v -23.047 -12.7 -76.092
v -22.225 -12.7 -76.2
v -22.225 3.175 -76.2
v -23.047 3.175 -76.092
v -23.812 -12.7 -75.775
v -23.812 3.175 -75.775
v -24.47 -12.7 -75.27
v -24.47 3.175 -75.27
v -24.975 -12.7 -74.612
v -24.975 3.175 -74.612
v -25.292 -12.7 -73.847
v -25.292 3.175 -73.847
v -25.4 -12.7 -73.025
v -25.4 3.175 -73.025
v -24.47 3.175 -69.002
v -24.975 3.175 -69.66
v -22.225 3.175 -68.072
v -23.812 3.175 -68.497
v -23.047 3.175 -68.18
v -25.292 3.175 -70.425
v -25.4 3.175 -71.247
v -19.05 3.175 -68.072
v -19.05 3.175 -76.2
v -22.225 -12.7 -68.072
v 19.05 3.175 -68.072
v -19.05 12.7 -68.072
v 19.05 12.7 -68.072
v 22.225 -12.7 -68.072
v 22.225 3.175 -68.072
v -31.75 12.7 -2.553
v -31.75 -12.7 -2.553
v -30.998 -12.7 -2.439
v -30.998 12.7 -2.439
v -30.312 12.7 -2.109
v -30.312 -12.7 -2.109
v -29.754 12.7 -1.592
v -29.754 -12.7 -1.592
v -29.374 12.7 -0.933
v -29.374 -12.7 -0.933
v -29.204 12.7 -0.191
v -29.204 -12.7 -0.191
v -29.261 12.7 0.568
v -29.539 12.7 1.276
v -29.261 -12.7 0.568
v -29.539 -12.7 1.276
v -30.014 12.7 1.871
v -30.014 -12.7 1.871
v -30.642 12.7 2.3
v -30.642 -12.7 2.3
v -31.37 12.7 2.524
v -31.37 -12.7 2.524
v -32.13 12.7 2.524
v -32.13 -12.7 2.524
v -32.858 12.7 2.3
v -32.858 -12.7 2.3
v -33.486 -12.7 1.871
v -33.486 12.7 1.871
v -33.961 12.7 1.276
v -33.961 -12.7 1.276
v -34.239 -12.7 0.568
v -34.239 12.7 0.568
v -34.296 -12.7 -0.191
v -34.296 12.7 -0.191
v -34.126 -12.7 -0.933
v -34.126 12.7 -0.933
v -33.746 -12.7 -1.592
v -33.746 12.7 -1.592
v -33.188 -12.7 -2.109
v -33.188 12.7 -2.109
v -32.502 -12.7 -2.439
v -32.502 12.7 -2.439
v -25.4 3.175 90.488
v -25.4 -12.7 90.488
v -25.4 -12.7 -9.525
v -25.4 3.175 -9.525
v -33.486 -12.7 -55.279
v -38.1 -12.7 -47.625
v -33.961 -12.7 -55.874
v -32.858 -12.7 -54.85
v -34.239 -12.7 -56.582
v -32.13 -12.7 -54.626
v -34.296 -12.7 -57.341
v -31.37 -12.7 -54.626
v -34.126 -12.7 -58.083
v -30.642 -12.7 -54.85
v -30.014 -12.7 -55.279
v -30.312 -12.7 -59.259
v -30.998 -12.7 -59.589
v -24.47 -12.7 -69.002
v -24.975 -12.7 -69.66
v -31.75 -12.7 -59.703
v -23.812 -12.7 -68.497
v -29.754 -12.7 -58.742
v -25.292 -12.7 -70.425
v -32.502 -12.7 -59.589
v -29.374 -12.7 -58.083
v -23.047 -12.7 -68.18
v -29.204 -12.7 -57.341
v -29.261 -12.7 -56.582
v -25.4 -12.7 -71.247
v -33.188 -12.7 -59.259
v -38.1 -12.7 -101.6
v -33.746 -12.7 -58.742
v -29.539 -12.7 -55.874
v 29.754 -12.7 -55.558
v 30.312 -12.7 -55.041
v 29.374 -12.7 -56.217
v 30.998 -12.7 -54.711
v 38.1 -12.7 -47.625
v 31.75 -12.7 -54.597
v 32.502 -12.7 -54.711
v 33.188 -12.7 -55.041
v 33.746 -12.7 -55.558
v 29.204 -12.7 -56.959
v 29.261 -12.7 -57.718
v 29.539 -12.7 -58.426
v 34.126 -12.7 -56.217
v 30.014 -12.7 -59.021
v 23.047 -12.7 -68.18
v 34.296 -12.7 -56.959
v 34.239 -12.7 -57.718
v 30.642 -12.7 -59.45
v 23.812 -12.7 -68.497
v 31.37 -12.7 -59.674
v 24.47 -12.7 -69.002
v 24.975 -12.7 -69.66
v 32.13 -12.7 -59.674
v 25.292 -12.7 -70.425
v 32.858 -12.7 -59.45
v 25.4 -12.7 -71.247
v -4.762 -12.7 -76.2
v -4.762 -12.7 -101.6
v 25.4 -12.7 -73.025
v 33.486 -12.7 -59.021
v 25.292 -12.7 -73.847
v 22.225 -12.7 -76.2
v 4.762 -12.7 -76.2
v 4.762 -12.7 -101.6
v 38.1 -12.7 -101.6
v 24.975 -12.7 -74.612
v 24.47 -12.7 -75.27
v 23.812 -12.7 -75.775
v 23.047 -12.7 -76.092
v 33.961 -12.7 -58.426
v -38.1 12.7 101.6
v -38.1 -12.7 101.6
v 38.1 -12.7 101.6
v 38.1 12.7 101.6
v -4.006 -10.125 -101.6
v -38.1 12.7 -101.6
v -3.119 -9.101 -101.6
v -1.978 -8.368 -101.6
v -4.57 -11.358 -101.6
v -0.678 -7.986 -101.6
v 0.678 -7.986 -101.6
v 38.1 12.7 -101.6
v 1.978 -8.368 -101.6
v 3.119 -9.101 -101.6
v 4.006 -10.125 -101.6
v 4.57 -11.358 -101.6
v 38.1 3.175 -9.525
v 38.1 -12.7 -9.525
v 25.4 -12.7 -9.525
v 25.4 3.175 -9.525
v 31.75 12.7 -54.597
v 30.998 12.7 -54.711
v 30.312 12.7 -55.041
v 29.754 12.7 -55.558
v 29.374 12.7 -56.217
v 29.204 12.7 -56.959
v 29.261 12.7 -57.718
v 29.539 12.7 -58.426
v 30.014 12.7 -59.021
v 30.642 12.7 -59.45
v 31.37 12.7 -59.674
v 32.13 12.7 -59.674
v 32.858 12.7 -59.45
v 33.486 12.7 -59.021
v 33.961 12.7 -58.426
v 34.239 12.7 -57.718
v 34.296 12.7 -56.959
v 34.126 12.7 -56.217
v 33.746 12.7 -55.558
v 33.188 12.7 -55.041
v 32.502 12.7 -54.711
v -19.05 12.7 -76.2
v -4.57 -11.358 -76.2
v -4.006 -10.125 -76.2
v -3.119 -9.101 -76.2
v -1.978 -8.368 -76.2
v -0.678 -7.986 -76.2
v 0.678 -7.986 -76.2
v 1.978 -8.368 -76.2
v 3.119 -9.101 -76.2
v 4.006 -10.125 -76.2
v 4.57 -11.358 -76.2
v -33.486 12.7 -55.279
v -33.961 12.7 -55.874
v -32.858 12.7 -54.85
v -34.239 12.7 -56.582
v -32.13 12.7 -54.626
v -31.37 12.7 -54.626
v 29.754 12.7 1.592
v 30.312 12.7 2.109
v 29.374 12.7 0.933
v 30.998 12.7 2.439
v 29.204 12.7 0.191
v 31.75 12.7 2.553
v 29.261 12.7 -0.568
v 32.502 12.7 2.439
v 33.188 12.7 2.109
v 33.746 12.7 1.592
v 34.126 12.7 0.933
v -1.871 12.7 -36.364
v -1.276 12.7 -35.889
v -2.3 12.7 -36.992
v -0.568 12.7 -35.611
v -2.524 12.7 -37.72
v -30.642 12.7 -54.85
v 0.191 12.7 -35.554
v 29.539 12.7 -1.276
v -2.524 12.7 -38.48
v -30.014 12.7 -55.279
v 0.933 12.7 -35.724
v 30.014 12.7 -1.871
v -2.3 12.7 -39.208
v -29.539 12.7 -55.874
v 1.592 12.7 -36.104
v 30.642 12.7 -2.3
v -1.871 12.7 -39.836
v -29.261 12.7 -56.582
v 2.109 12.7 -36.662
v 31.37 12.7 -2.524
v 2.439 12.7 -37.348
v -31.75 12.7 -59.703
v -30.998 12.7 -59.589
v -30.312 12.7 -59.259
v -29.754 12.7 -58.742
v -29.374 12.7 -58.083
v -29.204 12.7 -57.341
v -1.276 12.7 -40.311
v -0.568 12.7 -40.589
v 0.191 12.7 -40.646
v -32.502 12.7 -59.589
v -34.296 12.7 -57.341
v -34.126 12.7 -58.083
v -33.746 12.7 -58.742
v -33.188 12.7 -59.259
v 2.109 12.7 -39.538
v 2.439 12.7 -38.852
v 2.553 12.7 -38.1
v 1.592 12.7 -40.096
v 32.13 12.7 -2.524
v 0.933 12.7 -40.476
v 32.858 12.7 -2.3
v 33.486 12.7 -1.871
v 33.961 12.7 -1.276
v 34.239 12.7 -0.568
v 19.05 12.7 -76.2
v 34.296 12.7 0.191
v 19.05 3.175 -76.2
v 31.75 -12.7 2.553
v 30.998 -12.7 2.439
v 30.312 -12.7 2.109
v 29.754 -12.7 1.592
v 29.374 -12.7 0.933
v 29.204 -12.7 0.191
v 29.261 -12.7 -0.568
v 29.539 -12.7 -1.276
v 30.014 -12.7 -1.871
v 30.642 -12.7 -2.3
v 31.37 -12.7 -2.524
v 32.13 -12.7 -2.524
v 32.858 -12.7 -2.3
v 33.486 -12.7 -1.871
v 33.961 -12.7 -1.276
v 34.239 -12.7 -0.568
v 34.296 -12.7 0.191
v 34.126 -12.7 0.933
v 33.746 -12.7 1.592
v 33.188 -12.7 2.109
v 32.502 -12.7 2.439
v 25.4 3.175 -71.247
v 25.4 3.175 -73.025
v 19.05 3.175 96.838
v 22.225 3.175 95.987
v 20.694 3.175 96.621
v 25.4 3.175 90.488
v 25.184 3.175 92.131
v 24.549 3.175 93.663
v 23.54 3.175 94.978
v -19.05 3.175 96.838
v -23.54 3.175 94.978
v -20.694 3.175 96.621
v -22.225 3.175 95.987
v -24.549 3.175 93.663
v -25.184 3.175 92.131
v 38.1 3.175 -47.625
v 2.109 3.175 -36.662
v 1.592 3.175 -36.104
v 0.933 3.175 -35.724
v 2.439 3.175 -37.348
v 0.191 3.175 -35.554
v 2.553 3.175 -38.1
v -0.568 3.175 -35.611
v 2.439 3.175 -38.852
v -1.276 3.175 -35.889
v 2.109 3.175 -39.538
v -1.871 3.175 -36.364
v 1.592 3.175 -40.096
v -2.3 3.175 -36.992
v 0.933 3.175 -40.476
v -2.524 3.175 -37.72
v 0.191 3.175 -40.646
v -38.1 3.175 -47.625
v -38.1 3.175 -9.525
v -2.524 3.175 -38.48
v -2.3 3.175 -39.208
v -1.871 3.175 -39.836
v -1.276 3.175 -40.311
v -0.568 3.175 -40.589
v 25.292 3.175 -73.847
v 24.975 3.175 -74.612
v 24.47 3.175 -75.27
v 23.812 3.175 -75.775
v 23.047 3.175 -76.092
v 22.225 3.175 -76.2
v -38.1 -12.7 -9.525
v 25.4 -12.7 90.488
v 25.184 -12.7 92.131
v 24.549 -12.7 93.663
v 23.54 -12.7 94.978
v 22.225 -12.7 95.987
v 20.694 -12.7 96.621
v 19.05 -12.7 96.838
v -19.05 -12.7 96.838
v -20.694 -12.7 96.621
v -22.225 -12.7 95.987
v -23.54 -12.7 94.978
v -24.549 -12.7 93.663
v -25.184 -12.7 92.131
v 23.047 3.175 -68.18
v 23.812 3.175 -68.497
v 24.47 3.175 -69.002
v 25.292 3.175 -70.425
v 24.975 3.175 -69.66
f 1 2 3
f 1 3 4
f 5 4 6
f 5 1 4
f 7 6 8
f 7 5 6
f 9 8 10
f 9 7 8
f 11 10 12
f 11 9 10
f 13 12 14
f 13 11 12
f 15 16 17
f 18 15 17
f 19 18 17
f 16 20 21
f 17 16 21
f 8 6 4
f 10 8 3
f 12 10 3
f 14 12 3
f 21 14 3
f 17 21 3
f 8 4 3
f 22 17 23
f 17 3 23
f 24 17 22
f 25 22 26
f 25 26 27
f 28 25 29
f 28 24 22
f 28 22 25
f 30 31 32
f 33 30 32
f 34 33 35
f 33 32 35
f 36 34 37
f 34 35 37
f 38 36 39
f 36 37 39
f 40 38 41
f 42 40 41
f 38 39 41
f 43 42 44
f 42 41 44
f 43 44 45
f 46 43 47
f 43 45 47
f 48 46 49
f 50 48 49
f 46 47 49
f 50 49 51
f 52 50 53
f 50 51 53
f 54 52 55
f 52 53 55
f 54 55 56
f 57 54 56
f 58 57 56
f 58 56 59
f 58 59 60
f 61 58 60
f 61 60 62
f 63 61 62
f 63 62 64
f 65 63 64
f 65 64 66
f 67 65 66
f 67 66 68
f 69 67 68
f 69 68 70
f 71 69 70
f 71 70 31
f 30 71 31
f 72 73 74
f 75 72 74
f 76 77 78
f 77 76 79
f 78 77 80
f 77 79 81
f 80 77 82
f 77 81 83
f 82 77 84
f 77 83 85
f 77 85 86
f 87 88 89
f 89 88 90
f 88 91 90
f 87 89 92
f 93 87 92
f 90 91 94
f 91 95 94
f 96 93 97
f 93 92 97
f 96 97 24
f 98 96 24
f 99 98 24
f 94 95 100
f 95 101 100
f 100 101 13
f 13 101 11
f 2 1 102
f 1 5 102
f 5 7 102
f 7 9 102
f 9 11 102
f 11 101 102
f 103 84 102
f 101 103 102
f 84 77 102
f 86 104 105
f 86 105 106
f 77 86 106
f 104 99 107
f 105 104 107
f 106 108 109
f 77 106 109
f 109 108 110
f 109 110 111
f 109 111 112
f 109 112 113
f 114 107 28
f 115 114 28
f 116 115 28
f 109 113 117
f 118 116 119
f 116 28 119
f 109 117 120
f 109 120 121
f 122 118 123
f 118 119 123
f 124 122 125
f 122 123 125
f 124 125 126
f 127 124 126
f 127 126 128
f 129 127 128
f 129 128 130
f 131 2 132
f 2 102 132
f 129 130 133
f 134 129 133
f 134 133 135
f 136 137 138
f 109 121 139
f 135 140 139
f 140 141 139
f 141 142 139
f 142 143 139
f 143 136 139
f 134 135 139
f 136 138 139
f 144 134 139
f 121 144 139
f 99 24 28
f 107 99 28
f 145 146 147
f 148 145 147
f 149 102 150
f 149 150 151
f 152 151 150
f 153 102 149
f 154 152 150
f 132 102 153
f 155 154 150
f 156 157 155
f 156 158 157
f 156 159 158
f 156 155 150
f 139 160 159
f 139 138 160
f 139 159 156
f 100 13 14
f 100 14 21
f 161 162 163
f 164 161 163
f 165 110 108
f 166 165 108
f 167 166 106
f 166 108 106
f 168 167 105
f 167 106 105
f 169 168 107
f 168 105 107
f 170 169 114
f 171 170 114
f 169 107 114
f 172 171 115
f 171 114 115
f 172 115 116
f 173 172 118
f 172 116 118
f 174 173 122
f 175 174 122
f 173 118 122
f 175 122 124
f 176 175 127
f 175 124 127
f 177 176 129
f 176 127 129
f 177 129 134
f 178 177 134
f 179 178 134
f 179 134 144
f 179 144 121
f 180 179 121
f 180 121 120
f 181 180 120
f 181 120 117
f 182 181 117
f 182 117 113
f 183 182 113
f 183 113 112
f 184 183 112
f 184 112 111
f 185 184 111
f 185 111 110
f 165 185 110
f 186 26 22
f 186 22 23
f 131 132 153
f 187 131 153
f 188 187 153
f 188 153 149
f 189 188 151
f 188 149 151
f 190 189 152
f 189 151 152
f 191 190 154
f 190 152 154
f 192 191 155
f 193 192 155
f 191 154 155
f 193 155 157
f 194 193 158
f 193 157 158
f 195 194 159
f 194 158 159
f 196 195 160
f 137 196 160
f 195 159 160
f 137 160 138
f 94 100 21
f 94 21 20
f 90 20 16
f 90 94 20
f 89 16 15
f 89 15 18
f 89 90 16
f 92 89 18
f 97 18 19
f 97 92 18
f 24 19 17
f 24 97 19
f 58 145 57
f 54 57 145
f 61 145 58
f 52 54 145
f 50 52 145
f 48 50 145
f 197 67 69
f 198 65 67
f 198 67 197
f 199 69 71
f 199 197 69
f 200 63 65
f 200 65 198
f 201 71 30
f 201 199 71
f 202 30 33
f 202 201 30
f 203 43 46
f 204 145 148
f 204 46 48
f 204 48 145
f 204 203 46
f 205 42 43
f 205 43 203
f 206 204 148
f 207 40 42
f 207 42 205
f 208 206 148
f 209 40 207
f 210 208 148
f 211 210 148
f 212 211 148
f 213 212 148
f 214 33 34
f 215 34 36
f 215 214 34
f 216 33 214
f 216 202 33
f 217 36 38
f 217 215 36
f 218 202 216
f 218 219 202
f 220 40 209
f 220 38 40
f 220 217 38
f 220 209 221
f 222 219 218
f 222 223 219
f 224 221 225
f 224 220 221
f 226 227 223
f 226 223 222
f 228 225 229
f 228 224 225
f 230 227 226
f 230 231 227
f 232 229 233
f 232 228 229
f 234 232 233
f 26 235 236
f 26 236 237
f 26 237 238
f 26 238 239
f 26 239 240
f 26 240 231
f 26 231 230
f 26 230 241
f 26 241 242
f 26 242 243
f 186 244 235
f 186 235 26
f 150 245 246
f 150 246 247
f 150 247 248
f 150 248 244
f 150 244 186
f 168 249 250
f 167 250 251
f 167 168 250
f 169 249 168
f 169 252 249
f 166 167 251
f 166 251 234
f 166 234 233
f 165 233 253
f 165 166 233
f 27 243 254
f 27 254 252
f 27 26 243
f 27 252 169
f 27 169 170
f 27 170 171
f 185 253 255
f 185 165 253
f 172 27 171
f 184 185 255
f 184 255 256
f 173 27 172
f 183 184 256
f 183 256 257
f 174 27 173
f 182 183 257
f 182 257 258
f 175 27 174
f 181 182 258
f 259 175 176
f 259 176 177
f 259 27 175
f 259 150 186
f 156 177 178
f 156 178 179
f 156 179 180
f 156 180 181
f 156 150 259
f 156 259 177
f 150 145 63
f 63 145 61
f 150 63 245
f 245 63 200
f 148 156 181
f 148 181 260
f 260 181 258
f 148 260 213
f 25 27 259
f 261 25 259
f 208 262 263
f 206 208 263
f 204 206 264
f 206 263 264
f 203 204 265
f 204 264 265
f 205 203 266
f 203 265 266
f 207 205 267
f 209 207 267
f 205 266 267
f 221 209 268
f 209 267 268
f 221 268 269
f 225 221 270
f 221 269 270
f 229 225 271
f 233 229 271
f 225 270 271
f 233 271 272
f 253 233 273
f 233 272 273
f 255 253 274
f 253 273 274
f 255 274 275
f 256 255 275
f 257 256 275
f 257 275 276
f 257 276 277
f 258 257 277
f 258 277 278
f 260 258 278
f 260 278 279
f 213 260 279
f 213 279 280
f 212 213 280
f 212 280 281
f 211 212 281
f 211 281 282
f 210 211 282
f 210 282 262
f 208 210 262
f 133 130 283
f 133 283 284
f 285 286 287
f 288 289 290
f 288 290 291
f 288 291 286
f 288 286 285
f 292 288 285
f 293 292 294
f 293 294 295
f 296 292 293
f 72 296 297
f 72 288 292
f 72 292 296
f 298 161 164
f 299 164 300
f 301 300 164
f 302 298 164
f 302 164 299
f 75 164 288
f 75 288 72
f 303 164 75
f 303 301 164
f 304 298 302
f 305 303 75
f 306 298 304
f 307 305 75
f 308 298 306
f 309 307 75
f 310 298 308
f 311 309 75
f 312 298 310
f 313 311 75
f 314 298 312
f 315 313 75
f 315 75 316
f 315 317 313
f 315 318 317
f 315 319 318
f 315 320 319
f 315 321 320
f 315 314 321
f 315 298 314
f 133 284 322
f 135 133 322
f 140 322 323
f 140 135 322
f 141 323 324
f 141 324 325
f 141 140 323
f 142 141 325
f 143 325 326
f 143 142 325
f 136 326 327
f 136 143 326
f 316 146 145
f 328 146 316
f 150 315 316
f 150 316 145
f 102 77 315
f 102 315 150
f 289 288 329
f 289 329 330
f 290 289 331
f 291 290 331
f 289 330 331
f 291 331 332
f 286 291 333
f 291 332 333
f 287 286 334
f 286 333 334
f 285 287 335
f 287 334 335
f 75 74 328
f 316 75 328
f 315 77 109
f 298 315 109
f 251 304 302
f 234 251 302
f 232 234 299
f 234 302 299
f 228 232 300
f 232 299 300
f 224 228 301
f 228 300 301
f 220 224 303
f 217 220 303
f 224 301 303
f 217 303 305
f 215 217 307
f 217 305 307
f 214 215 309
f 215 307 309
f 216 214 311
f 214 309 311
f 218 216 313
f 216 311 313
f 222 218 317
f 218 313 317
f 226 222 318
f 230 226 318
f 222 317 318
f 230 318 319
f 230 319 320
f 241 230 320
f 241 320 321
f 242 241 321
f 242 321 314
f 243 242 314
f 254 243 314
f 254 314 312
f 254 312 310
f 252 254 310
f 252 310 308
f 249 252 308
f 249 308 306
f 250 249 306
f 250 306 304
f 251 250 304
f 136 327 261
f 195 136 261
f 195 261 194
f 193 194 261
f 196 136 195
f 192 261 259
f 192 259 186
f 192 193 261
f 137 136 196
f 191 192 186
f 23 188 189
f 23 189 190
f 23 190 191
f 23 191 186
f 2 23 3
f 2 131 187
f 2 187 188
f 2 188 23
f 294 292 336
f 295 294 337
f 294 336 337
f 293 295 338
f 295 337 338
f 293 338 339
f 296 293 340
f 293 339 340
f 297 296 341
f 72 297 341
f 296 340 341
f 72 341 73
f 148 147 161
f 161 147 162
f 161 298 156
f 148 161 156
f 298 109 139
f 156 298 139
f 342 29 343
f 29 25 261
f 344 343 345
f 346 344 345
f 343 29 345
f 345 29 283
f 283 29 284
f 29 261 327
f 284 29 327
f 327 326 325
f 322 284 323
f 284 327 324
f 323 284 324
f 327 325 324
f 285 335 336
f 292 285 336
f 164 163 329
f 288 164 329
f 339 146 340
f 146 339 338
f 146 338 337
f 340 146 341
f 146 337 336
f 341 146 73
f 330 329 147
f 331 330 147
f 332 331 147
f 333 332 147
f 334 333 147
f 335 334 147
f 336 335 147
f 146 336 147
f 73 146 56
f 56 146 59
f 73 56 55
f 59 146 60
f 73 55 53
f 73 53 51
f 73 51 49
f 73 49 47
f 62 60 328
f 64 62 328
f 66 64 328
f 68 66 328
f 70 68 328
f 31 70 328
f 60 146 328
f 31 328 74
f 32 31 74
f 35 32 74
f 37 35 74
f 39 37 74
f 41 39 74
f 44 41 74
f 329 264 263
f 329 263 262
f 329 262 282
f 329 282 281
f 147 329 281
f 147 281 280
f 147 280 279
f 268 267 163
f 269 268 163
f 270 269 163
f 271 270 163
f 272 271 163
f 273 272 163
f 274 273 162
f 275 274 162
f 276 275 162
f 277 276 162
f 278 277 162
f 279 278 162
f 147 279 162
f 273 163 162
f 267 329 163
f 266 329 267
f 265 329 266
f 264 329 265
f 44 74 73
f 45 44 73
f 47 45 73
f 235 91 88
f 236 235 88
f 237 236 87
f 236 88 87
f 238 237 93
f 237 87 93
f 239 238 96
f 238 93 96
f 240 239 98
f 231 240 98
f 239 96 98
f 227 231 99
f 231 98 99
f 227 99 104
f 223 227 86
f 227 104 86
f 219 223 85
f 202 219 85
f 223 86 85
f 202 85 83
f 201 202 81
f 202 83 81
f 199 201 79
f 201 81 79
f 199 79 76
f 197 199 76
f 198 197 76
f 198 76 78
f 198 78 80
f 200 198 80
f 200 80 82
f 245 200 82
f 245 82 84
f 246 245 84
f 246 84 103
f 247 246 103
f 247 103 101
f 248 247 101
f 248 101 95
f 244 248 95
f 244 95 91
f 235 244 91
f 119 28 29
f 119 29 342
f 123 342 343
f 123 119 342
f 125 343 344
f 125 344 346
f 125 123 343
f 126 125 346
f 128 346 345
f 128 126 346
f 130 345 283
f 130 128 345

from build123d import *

# Parameters (mm, degrees)
BOSS_EXTRUDE1_DEPTH         = 12.7
BOSS_EXTRUDE1_DEPTH_BACK    = 12.7
SKETCH1_W                   = 76.2
SKETCH1_H                   = 203.2
SKETCH2_R                   = 4.7625
CUT_EXTRUDE1_DEPTH          = 25.4
CUT_EXTRUDE2_DEPTH          = 15.875
SKETCH5_W                   = 38.1
SKETCH5_H                   = 8.128
CUT_EXTRUDE4_DEPTH          = 110.249530891
F_1_4_20_TAPPED_HOLE1_D     = 5.1054
F_1_4_20_TAPPED_HOLE1_DEPTH = 19.05
F_1_4_20_TAPPED_HOLE1_TIP   = 1.533816902
SKETCH9_R                   = 2.5527
CUT_EXTRUDE5_DEPTH          = 112.44204772


with BuildPart() as part:
    # Sketch1 → Boss-Extrude1 (new, two sides: drawn at the far end of the back side and taken through both)
    with BuildSketch(Plane(origin=(0, 0, 0), x_dir=(1, 0, 0), z_dir=(0, 1, 0)).offset(-BOSS_EXTRUDE1_DEPTH_BACK)):
        Rectangle(SKETCH1_W, SKETCH1_H)
    extrude(amount=BOSS_EXTRUDE1_DEPTH + BOSS_EXTRUDE1_DEPTH_BACK)

    # Sketch2 → Cut-Extrude1 (cut)
    with BuildSketch(Plane(origin=(0, 0, -101.6), x_dir=(-1, 0, 0), z_dir=(0, 0, -1))):
        with Locations((0, -12.7)):
            Circle(SKETCH2_R)
    extrude(amount=-CUT_EXTRUDE1_DEPTH, mode=Mode.SUBTRACT)

    # Sketch3 → Cut-Extrude2 (cut)
    with BuildSketch(Plane(origin=(0, -12.7, 0), x_dir=(-1, 0, 0), z_dir=(0, -1, 0))):
        with BuildLine():
            Line((-19.05, -96.8375), (19.05, -96.8375))
            ThreePointArc((19.05, -96.8375), (23.540128061, -94.977628061), (25.4, -90.4875))
            Line((25.4, -90.4875), (25.4, 9.525))
            Line((25.4, 9.525), (44.45, 9.525))
            Line((44.45, 9.525), (44.45, 47.625))
            Line((44.45, 47.625), (-44.45, 47.625))
            Line((-44.45, 47.625), (-44.45, 9.525))
            Line((-44.45, 9.525), (-25.4, 9.525))
            Line((-25.4, 9.525), (-25.4, -90.4875))
            ThreePointArc((-25.4, -90.4875), (-23.540128061, -94.977628061), (-19.05, -96.8375))
        make_face()
        with BuildLine():
            Line((-22.225, 76.2), (22.225, 76.2))
            ThreePointArc((22.225, 76.2), (24.47006403, 75.27006403), (25.4, 73.025))
            Line((25.4, 73.025), (25.4, 71.247))
            ThreePointArc((25.4, 71.247), (24.47006403, 69.00193597), (22.225, 68.072))
            Line((22.225, 68.072), (-22.225, 68.072))
            ThreePointArc((-22.225, 68.072), (-24.47006403, 69.00193597), (-25.4, 71.247))
            Line((-25.4, 71.247), (-25.4, 73.025))
            ThreePointArc((-25.4, 73.025), (-24.47006403, 75.27006403), (-22.225, 76.2))
        make_face()
    extrude(amount=-CUT_EXTRUDE2_DEPTH, mode=Mode.SUBTRACT)

    # Sketch5 → Cut-Extrude4 (cut, through all)
    with BuildSketch(Plane(origin=(0, 0, 0), x_dir=(1, 0, 0), z_dir=(0, 1, 0))):
        with Locations((0, 72.136)):
            Rectangle(SKETCH5_W, SKETCH5_H)
    extrude(amount=CUT_EXTRUDE4_DEPTH, mode=Mode.SUBTRACT)

    # 1/4-20 Tapped Hole1
    with Locations(Plane(origin=(-11.034450397, 12.7, 14.547513529), x_dir=(-1, 0, 0), z_dir=(0, 1, 0))):
        with Locations((-11.034450397, -52.647513529)):
            Hole(F_1_4_20_TAPPED_HOLE1_D / 2, depth=F_1_4_20_TAPPED_HOLE1_DEPTH)
            with Locations((0, 0, -(F_1_4_20_TAPPED_HOLE1_DEPTH + F_1_4_20_TAPPED_HOLE1_TIP / 2))):  # 118° drill point
                Cone(0, F_1_4_20_TAPPED_HOLE1_D / 2, F_1_4_20_TAPPED_HOLE1_TIP, mode=Mode.SUBTRACT)

    # Sketch9 → Cut-Extrude5 (cut, through all)
    with BuildSketch(Plane(origin=(0, -12.7, 0), x_dir=(-1, 0, 0), z_dir=(0, -1, 0))):
        with Locations((31.75, 57.15)):
            Circle(SKETCH9_R)
        with Locations((31.75, 0)):
            Circle(SKETCH9_R)
        with Locations((-31.75, 0)):
            Circle(SKETCH9_R)
        with Locations((-31.75, 57.15)):
            Circle(SKETCH9_R)
    extrude(amount=-CUT_EXTRUDE5_DEPTH, mode=Mode.SUBTRACT)


solid = part.part
